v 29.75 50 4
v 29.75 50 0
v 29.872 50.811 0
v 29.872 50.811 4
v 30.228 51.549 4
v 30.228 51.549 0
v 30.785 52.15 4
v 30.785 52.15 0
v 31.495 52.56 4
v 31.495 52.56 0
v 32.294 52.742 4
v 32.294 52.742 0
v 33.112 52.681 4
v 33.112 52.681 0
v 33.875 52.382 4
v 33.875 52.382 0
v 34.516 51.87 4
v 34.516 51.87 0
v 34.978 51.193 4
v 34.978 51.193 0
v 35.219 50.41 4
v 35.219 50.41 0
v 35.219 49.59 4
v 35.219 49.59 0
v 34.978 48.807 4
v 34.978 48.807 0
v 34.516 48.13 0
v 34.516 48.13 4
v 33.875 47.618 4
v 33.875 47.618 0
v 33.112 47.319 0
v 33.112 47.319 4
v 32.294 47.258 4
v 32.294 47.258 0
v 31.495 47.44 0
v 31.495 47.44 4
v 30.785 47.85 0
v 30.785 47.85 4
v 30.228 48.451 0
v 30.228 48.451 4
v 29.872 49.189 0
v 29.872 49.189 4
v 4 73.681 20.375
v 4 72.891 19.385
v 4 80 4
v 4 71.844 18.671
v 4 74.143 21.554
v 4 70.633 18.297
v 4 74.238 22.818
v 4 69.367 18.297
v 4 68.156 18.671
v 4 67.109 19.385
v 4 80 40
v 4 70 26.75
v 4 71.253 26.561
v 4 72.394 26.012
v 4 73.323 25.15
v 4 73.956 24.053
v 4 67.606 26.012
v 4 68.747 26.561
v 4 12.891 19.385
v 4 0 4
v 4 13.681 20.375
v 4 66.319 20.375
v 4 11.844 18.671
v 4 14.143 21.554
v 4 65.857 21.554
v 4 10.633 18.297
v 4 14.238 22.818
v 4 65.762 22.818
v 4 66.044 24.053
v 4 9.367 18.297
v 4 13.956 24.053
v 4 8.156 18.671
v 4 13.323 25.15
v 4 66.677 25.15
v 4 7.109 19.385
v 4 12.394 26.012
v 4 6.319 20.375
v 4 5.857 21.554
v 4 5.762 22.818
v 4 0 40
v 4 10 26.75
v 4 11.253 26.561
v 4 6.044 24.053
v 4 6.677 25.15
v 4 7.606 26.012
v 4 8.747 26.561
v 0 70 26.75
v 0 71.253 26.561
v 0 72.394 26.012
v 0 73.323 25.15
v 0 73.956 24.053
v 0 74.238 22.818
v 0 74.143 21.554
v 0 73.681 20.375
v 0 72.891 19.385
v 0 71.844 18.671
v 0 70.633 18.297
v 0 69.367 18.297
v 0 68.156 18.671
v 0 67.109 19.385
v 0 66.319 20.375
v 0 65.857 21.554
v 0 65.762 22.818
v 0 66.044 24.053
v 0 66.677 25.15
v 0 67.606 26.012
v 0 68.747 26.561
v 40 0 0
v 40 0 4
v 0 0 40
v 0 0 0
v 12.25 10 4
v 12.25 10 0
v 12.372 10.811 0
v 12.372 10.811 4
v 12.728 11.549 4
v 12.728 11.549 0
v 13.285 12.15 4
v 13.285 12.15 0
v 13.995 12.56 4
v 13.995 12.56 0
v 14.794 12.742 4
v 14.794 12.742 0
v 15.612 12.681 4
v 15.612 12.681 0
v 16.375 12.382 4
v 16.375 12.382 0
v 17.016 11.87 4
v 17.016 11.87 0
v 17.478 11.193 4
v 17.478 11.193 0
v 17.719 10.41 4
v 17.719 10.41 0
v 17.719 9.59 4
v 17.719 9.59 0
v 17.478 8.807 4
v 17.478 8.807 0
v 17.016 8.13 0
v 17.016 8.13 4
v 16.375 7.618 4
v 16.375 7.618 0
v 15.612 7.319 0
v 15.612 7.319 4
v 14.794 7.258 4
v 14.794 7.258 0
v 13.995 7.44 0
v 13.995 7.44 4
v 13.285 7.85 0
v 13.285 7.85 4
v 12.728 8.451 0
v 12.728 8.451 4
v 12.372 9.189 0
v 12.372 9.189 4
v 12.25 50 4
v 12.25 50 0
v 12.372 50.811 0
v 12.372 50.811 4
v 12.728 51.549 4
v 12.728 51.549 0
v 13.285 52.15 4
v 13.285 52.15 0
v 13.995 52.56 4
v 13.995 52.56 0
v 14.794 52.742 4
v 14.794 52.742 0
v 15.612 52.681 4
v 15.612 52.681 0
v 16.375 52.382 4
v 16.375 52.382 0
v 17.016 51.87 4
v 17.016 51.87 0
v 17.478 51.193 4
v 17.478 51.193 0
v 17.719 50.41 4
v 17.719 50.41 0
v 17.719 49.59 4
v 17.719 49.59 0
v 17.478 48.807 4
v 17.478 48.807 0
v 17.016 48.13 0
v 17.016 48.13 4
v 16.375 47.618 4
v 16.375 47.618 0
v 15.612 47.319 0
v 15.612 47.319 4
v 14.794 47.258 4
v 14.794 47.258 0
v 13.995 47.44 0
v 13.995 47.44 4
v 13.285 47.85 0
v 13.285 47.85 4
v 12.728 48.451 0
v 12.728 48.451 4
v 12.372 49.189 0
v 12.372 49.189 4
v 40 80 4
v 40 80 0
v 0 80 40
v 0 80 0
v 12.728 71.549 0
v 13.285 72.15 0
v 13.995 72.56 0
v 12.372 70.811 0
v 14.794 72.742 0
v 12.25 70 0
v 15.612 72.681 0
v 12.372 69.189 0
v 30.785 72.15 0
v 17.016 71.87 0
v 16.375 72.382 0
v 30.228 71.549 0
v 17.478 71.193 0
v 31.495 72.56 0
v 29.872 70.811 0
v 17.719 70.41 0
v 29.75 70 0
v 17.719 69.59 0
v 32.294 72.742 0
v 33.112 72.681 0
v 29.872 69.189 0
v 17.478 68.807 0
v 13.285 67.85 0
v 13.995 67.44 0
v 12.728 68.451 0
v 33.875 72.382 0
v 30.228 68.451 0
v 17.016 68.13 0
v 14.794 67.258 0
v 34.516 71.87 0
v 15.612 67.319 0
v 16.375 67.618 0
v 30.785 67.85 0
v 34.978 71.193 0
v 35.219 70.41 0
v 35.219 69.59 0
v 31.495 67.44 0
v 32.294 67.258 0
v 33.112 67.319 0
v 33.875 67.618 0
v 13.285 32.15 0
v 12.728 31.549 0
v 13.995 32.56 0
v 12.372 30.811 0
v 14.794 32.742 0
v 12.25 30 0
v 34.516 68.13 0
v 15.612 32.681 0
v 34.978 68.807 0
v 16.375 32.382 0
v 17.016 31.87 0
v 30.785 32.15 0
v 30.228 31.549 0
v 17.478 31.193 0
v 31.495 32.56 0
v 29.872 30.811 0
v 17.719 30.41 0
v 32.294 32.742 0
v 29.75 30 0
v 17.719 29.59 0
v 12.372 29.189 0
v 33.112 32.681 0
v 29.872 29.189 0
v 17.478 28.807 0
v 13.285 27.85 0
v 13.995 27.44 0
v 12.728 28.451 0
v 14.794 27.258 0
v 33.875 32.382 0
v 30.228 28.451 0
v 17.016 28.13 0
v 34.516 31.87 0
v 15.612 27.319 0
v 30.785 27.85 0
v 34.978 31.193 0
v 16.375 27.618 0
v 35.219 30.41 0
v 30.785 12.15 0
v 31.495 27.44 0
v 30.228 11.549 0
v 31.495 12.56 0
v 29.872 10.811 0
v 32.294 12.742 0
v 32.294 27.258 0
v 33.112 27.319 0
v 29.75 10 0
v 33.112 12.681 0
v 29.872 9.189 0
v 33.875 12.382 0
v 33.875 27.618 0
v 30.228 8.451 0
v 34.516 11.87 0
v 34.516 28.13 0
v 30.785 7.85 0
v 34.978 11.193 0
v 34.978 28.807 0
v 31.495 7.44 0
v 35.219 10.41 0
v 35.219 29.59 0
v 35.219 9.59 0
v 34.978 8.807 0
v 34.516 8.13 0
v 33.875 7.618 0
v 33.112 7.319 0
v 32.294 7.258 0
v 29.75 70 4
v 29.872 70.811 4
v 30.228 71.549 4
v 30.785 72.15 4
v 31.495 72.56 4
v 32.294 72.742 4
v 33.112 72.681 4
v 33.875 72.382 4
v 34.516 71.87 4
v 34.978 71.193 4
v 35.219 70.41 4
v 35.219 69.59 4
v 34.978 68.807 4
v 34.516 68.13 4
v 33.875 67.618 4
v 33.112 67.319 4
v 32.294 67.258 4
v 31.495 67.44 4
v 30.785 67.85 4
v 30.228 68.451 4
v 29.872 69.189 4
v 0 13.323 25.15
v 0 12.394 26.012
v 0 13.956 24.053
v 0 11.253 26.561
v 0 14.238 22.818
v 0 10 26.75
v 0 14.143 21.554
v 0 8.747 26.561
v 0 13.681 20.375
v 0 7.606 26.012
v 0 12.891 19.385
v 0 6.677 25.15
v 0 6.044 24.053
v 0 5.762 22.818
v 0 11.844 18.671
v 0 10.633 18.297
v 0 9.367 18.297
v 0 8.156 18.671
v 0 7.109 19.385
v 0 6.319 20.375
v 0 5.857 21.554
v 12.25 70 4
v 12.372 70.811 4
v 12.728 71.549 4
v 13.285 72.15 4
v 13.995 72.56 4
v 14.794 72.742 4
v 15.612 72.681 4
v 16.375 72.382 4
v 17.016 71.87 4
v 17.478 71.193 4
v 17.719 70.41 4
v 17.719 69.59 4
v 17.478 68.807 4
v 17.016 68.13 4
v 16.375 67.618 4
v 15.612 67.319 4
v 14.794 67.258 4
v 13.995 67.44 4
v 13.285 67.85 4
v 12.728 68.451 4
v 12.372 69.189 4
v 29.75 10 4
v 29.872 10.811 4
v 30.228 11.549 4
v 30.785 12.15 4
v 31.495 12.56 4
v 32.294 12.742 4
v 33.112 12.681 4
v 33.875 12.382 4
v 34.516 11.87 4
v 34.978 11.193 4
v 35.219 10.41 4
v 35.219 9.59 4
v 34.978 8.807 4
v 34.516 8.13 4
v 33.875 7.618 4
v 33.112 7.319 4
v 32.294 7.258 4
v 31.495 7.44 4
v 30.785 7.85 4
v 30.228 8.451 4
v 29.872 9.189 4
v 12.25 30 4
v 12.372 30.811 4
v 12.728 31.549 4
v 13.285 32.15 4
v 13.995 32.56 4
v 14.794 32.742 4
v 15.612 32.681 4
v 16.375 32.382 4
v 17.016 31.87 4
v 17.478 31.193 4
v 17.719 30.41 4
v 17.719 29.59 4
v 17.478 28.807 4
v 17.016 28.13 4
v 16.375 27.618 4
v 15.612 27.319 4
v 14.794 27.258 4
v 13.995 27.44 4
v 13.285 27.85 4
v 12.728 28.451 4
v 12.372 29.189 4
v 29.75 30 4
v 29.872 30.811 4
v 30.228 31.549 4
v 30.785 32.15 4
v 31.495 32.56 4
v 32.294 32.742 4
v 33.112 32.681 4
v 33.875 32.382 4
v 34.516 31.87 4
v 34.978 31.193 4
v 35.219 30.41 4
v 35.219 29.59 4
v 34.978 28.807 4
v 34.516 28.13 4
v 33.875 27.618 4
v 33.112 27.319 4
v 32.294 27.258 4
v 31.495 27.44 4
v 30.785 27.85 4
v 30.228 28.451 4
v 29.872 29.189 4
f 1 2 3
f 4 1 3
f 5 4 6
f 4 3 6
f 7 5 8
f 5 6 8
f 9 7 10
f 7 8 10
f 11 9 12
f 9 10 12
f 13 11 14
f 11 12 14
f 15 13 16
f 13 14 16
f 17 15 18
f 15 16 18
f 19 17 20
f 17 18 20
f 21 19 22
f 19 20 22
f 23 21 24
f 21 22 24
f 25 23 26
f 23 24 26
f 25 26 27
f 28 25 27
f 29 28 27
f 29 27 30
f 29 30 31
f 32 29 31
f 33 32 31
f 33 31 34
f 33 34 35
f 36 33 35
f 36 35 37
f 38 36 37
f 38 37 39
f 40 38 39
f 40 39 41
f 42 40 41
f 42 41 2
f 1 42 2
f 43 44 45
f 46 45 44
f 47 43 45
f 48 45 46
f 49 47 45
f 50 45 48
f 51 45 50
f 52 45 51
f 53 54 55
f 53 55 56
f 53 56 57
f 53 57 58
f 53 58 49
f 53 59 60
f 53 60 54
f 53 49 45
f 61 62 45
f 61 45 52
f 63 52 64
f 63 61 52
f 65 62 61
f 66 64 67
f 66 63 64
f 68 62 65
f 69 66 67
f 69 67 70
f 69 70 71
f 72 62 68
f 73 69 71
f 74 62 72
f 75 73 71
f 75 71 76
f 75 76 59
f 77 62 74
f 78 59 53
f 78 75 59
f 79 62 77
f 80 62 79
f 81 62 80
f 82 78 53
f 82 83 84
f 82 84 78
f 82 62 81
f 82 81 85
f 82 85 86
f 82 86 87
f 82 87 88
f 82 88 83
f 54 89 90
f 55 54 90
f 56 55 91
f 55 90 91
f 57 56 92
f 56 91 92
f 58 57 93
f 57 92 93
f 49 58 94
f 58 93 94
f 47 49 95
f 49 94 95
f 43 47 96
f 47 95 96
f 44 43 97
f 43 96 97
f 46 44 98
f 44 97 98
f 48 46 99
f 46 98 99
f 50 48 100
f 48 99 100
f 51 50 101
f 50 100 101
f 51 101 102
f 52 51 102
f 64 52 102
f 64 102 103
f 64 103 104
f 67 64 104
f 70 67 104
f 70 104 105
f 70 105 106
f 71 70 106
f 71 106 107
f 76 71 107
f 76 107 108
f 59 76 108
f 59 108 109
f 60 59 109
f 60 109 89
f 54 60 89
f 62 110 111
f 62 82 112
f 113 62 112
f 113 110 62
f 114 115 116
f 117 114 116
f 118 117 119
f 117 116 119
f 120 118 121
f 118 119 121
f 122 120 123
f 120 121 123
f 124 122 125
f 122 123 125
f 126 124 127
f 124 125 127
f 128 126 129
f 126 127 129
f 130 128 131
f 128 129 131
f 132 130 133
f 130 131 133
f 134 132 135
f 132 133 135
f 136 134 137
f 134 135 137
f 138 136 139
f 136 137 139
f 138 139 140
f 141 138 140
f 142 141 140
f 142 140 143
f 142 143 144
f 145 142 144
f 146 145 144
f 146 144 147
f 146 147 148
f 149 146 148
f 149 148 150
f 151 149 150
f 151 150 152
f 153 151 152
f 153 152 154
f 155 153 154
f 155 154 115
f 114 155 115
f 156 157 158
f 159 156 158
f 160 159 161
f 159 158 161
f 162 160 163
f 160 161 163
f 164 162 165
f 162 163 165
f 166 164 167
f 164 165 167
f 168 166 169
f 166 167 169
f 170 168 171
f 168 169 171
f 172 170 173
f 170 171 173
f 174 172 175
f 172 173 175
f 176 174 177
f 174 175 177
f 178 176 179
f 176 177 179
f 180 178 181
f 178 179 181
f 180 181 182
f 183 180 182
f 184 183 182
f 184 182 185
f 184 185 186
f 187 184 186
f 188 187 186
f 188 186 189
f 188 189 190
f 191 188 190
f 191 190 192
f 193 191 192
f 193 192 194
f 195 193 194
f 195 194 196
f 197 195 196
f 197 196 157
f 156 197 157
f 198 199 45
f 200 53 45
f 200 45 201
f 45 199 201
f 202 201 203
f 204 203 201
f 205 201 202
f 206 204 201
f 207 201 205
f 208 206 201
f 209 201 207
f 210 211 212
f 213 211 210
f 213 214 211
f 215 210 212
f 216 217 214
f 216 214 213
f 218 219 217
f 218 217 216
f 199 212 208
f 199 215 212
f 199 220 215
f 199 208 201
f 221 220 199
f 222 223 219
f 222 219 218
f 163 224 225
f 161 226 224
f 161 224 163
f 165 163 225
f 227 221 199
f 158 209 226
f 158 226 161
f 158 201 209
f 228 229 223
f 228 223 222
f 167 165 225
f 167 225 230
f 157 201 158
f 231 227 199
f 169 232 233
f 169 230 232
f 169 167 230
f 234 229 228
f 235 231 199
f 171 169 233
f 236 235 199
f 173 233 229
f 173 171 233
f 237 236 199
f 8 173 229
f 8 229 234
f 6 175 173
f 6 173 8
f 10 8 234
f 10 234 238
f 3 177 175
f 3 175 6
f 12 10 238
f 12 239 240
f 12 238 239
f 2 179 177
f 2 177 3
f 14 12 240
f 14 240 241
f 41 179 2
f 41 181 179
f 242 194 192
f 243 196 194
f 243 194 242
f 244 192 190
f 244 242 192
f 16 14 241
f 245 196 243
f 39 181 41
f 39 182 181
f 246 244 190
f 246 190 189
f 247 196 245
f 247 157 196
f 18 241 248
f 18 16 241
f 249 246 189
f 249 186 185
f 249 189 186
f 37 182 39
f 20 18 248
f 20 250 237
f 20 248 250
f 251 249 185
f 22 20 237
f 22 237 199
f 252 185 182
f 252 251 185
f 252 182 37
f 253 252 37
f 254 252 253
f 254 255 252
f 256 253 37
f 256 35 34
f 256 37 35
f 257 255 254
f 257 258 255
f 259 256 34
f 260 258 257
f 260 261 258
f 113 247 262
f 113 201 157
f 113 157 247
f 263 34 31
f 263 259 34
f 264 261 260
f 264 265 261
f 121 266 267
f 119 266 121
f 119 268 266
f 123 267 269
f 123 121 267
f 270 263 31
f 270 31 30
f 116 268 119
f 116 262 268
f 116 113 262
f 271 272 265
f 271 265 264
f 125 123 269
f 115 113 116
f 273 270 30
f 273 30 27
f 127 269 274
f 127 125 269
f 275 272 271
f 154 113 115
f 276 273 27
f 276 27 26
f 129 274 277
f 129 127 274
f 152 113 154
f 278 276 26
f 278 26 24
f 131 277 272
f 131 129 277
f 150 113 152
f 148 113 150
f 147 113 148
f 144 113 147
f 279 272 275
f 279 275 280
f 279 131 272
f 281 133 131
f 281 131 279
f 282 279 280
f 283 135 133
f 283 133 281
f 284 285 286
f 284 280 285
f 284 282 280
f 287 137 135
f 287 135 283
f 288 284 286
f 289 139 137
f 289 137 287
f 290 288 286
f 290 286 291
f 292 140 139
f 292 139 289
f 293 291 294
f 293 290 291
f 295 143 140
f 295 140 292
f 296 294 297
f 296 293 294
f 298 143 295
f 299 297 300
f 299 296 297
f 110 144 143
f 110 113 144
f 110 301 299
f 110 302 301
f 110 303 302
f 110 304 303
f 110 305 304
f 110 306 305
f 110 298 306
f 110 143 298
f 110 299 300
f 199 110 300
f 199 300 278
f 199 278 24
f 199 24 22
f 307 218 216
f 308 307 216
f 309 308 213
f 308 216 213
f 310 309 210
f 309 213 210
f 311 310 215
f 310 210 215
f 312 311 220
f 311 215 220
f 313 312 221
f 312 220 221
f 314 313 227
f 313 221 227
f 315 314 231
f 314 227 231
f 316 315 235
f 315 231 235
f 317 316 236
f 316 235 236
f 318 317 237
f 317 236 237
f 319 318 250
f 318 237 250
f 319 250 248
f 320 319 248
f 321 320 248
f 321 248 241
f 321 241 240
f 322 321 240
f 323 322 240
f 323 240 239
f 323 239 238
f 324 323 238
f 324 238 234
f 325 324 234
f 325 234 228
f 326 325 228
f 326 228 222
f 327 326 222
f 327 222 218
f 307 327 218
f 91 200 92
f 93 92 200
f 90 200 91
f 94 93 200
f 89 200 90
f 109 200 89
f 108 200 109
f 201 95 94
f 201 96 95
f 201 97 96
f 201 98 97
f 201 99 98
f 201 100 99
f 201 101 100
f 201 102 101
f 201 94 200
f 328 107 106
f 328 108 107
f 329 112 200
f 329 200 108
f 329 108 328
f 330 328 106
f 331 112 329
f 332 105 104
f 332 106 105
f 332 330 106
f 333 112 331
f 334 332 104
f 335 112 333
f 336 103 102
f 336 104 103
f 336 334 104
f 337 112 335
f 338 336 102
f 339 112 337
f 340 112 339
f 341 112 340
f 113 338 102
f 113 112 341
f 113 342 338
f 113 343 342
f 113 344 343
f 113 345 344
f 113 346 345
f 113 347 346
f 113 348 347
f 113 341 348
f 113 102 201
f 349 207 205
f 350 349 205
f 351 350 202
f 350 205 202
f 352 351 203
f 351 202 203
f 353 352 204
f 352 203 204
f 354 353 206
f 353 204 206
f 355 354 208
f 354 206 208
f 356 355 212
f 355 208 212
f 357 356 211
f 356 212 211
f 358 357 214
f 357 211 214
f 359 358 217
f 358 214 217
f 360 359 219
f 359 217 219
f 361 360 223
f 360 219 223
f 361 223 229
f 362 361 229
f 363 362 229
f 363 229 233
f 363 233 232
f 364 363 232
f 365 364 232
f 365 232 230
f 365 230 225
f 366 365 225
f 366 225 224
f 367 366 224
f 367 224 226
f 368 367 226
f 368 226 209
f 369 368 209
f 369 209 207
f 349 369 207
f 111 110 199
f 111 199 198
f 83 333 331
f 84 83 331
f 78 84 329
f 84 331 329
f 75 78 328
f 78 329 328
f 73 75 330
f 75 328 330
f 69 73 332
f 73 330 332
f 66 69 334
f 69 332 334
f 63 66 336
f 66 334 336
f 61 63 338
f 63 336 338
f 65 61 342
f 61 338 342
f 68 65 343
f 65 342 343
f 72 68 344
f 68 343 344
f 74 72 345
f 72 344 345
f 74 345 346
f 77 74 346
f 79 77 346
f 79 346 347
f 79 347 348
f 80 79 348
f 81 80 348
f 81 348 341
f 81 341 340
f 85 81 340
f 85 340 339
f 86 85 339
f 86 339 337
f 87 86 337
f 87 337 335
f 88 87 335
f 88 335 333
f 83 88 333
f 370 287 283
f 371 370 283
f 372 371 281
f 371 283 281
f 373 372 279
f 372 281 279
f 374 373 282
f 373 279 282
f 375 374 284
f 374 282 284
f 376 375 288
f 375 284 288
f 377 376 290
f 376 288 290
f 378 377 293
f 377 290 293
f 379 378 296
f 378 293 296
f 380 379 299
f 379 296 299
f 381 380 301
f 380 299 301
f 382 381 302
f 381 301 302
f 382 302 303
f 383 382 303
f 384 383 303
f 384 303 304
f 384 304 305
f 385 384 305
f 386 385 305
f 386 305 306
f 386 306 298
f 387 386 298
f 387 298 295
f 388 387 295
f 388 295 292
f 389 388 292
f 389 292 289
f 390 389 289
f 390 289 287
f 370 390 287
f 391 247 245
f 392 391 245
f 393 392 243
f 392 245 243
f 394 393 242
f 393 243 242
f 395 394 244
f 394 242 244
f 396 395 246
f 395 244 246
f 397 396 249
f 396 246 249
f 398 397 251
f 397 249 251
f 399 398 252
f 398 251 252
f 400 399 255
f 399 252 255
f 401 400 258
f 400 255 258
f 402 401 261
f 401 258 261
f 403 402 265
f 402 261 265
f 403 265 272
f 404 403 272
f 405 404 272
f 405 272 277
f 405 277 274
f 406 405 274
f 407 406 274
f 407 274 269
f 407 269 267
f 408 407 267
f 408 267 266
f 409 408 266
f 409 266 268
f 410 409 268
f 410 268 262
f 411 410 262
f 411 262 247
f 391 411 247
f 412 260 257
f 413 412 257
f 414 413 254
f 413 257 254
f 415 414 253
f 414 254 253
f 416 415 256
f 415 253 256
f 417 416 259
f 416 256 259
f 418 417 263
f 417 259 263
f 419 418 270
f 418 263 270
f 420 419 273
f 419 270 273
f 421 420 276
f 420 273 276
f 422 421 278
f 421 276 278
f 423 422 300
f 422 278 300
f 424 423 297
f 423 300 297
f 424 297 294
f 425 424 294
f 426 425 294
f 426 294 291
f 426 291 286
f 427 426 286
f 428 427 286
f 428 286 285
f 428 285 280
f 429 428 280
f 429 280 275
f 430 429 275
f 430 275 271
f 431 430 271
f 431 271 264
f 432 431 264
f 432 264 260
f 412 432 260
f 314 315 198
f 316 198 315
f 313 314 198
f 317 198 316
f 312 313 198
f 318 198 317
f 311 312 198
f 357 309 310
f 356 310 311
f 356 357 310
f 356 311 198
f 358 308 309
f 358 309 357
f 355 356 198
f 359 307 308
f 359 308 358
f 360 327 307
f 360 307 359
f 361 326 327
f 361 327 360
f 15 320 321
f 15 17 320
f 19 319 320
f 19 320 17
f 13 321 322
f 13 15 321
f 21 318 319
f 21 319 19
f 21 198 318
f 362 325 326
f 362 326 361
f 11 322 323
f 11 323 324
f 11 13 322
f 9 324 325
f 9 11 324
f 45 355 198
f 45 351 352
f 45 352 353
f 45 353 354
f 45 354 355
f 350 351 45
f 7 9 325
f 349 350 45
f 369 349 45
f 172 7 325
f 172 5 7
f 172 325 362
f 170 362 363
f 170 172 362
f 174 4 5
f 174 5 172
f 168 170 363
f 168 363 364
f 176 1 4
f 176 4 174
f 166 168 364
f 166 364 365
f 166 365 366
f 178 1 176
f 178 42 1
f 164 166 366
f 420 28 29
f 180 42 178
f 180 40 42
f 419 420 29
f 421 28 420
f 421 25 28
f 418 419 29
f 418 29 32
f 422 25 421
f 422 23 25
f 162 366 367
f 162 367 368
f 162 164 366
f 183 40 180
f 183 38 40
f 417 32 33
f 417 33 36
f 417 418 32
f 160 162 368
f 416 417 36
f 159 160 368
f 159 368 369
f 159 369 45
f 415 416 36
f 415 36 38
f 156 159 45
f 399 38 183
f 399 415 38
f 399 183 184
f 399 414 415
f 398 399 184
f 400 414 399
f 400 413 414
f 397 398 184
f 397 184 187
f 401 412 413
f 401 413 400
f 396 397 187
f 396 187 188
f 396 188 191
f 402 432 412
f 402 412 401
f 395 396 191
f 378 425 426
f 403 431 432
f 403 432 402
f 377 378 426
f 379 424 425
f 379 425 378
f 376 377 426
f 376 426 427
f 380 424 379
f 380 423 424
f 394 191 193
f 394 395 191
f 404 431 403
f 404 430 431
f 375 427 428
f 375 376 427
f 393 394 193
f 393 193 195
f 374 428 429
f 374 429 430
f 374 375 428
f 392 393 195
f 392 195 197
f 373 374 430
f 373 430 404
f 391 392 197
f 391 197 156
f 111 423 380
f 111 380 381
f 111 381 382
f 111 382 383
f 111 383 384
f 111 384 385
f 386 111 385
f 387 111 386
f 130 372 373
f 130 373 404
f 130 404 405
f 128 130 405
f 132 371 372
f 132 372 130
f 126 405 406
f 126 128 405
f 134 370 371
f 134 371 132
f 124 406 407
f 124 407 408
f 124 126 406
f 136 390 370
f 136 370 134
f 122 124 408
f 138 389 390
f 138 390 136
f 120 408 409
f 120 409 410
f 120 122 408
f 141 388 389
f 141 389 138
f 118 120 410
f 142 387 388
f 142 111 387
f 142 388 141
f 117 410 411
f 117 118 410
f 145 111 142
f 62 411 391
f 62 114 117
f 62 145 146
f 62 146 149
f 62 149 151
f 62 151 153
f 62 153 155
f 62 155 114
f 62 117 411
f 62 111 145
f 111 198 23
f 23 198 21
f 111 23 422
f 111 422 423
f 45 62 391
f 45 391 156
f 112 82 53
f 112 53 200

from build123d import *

# Parameters (mm, degrees)
BOSS_EXTRUDE1_DEPTH        = 80
F_5_5_5_5_DIAMETER_HOLE1_D = 5.5
F_8_5_8_5_DIAMETER_HOLE1_D = 8.5


with BuildPart() as part:
    # Sketch1 → Boss-Extrude1 (new body)
    with BuildSketch(Plane(origin=(0, 0, 0), x_dir=(1, 0, 0), z_dir=(0, 1, 0))):
        Polygon((0, 0), (40, 0), (40, -4), (4, -4), (4, -40), (0, -40), align=None)
    extrude(amount=BOSS_EXTRUDE1_DEPTH)

    # Ø5.5 (5.5) Diameter Hole1 (through all)
    with Locations(Plane.XY.offset(4)):
        with Locations((32.5, 70), (15, 70), (15, 50), (32.5, 50), (32.5, 30), (15, 30), (15, 10), (32.5, 10)):
            Hole(F_5_5_5_5_DIAMETER_HOLE1_D / 2)

    # Ø8.5 (8.5) Diameter Hole1 (through all)
    with Locations(Plane(origin=(4, 0, 0), x_dir=(0, 0, -1), z_dir=(1, 0, 0))):
        with Locations((-22.5, 70), (-22.5, 10)):
            Hole(F_8_5_8_5_DIAMETER_HOLE1_D / 2)


solid = part.part
